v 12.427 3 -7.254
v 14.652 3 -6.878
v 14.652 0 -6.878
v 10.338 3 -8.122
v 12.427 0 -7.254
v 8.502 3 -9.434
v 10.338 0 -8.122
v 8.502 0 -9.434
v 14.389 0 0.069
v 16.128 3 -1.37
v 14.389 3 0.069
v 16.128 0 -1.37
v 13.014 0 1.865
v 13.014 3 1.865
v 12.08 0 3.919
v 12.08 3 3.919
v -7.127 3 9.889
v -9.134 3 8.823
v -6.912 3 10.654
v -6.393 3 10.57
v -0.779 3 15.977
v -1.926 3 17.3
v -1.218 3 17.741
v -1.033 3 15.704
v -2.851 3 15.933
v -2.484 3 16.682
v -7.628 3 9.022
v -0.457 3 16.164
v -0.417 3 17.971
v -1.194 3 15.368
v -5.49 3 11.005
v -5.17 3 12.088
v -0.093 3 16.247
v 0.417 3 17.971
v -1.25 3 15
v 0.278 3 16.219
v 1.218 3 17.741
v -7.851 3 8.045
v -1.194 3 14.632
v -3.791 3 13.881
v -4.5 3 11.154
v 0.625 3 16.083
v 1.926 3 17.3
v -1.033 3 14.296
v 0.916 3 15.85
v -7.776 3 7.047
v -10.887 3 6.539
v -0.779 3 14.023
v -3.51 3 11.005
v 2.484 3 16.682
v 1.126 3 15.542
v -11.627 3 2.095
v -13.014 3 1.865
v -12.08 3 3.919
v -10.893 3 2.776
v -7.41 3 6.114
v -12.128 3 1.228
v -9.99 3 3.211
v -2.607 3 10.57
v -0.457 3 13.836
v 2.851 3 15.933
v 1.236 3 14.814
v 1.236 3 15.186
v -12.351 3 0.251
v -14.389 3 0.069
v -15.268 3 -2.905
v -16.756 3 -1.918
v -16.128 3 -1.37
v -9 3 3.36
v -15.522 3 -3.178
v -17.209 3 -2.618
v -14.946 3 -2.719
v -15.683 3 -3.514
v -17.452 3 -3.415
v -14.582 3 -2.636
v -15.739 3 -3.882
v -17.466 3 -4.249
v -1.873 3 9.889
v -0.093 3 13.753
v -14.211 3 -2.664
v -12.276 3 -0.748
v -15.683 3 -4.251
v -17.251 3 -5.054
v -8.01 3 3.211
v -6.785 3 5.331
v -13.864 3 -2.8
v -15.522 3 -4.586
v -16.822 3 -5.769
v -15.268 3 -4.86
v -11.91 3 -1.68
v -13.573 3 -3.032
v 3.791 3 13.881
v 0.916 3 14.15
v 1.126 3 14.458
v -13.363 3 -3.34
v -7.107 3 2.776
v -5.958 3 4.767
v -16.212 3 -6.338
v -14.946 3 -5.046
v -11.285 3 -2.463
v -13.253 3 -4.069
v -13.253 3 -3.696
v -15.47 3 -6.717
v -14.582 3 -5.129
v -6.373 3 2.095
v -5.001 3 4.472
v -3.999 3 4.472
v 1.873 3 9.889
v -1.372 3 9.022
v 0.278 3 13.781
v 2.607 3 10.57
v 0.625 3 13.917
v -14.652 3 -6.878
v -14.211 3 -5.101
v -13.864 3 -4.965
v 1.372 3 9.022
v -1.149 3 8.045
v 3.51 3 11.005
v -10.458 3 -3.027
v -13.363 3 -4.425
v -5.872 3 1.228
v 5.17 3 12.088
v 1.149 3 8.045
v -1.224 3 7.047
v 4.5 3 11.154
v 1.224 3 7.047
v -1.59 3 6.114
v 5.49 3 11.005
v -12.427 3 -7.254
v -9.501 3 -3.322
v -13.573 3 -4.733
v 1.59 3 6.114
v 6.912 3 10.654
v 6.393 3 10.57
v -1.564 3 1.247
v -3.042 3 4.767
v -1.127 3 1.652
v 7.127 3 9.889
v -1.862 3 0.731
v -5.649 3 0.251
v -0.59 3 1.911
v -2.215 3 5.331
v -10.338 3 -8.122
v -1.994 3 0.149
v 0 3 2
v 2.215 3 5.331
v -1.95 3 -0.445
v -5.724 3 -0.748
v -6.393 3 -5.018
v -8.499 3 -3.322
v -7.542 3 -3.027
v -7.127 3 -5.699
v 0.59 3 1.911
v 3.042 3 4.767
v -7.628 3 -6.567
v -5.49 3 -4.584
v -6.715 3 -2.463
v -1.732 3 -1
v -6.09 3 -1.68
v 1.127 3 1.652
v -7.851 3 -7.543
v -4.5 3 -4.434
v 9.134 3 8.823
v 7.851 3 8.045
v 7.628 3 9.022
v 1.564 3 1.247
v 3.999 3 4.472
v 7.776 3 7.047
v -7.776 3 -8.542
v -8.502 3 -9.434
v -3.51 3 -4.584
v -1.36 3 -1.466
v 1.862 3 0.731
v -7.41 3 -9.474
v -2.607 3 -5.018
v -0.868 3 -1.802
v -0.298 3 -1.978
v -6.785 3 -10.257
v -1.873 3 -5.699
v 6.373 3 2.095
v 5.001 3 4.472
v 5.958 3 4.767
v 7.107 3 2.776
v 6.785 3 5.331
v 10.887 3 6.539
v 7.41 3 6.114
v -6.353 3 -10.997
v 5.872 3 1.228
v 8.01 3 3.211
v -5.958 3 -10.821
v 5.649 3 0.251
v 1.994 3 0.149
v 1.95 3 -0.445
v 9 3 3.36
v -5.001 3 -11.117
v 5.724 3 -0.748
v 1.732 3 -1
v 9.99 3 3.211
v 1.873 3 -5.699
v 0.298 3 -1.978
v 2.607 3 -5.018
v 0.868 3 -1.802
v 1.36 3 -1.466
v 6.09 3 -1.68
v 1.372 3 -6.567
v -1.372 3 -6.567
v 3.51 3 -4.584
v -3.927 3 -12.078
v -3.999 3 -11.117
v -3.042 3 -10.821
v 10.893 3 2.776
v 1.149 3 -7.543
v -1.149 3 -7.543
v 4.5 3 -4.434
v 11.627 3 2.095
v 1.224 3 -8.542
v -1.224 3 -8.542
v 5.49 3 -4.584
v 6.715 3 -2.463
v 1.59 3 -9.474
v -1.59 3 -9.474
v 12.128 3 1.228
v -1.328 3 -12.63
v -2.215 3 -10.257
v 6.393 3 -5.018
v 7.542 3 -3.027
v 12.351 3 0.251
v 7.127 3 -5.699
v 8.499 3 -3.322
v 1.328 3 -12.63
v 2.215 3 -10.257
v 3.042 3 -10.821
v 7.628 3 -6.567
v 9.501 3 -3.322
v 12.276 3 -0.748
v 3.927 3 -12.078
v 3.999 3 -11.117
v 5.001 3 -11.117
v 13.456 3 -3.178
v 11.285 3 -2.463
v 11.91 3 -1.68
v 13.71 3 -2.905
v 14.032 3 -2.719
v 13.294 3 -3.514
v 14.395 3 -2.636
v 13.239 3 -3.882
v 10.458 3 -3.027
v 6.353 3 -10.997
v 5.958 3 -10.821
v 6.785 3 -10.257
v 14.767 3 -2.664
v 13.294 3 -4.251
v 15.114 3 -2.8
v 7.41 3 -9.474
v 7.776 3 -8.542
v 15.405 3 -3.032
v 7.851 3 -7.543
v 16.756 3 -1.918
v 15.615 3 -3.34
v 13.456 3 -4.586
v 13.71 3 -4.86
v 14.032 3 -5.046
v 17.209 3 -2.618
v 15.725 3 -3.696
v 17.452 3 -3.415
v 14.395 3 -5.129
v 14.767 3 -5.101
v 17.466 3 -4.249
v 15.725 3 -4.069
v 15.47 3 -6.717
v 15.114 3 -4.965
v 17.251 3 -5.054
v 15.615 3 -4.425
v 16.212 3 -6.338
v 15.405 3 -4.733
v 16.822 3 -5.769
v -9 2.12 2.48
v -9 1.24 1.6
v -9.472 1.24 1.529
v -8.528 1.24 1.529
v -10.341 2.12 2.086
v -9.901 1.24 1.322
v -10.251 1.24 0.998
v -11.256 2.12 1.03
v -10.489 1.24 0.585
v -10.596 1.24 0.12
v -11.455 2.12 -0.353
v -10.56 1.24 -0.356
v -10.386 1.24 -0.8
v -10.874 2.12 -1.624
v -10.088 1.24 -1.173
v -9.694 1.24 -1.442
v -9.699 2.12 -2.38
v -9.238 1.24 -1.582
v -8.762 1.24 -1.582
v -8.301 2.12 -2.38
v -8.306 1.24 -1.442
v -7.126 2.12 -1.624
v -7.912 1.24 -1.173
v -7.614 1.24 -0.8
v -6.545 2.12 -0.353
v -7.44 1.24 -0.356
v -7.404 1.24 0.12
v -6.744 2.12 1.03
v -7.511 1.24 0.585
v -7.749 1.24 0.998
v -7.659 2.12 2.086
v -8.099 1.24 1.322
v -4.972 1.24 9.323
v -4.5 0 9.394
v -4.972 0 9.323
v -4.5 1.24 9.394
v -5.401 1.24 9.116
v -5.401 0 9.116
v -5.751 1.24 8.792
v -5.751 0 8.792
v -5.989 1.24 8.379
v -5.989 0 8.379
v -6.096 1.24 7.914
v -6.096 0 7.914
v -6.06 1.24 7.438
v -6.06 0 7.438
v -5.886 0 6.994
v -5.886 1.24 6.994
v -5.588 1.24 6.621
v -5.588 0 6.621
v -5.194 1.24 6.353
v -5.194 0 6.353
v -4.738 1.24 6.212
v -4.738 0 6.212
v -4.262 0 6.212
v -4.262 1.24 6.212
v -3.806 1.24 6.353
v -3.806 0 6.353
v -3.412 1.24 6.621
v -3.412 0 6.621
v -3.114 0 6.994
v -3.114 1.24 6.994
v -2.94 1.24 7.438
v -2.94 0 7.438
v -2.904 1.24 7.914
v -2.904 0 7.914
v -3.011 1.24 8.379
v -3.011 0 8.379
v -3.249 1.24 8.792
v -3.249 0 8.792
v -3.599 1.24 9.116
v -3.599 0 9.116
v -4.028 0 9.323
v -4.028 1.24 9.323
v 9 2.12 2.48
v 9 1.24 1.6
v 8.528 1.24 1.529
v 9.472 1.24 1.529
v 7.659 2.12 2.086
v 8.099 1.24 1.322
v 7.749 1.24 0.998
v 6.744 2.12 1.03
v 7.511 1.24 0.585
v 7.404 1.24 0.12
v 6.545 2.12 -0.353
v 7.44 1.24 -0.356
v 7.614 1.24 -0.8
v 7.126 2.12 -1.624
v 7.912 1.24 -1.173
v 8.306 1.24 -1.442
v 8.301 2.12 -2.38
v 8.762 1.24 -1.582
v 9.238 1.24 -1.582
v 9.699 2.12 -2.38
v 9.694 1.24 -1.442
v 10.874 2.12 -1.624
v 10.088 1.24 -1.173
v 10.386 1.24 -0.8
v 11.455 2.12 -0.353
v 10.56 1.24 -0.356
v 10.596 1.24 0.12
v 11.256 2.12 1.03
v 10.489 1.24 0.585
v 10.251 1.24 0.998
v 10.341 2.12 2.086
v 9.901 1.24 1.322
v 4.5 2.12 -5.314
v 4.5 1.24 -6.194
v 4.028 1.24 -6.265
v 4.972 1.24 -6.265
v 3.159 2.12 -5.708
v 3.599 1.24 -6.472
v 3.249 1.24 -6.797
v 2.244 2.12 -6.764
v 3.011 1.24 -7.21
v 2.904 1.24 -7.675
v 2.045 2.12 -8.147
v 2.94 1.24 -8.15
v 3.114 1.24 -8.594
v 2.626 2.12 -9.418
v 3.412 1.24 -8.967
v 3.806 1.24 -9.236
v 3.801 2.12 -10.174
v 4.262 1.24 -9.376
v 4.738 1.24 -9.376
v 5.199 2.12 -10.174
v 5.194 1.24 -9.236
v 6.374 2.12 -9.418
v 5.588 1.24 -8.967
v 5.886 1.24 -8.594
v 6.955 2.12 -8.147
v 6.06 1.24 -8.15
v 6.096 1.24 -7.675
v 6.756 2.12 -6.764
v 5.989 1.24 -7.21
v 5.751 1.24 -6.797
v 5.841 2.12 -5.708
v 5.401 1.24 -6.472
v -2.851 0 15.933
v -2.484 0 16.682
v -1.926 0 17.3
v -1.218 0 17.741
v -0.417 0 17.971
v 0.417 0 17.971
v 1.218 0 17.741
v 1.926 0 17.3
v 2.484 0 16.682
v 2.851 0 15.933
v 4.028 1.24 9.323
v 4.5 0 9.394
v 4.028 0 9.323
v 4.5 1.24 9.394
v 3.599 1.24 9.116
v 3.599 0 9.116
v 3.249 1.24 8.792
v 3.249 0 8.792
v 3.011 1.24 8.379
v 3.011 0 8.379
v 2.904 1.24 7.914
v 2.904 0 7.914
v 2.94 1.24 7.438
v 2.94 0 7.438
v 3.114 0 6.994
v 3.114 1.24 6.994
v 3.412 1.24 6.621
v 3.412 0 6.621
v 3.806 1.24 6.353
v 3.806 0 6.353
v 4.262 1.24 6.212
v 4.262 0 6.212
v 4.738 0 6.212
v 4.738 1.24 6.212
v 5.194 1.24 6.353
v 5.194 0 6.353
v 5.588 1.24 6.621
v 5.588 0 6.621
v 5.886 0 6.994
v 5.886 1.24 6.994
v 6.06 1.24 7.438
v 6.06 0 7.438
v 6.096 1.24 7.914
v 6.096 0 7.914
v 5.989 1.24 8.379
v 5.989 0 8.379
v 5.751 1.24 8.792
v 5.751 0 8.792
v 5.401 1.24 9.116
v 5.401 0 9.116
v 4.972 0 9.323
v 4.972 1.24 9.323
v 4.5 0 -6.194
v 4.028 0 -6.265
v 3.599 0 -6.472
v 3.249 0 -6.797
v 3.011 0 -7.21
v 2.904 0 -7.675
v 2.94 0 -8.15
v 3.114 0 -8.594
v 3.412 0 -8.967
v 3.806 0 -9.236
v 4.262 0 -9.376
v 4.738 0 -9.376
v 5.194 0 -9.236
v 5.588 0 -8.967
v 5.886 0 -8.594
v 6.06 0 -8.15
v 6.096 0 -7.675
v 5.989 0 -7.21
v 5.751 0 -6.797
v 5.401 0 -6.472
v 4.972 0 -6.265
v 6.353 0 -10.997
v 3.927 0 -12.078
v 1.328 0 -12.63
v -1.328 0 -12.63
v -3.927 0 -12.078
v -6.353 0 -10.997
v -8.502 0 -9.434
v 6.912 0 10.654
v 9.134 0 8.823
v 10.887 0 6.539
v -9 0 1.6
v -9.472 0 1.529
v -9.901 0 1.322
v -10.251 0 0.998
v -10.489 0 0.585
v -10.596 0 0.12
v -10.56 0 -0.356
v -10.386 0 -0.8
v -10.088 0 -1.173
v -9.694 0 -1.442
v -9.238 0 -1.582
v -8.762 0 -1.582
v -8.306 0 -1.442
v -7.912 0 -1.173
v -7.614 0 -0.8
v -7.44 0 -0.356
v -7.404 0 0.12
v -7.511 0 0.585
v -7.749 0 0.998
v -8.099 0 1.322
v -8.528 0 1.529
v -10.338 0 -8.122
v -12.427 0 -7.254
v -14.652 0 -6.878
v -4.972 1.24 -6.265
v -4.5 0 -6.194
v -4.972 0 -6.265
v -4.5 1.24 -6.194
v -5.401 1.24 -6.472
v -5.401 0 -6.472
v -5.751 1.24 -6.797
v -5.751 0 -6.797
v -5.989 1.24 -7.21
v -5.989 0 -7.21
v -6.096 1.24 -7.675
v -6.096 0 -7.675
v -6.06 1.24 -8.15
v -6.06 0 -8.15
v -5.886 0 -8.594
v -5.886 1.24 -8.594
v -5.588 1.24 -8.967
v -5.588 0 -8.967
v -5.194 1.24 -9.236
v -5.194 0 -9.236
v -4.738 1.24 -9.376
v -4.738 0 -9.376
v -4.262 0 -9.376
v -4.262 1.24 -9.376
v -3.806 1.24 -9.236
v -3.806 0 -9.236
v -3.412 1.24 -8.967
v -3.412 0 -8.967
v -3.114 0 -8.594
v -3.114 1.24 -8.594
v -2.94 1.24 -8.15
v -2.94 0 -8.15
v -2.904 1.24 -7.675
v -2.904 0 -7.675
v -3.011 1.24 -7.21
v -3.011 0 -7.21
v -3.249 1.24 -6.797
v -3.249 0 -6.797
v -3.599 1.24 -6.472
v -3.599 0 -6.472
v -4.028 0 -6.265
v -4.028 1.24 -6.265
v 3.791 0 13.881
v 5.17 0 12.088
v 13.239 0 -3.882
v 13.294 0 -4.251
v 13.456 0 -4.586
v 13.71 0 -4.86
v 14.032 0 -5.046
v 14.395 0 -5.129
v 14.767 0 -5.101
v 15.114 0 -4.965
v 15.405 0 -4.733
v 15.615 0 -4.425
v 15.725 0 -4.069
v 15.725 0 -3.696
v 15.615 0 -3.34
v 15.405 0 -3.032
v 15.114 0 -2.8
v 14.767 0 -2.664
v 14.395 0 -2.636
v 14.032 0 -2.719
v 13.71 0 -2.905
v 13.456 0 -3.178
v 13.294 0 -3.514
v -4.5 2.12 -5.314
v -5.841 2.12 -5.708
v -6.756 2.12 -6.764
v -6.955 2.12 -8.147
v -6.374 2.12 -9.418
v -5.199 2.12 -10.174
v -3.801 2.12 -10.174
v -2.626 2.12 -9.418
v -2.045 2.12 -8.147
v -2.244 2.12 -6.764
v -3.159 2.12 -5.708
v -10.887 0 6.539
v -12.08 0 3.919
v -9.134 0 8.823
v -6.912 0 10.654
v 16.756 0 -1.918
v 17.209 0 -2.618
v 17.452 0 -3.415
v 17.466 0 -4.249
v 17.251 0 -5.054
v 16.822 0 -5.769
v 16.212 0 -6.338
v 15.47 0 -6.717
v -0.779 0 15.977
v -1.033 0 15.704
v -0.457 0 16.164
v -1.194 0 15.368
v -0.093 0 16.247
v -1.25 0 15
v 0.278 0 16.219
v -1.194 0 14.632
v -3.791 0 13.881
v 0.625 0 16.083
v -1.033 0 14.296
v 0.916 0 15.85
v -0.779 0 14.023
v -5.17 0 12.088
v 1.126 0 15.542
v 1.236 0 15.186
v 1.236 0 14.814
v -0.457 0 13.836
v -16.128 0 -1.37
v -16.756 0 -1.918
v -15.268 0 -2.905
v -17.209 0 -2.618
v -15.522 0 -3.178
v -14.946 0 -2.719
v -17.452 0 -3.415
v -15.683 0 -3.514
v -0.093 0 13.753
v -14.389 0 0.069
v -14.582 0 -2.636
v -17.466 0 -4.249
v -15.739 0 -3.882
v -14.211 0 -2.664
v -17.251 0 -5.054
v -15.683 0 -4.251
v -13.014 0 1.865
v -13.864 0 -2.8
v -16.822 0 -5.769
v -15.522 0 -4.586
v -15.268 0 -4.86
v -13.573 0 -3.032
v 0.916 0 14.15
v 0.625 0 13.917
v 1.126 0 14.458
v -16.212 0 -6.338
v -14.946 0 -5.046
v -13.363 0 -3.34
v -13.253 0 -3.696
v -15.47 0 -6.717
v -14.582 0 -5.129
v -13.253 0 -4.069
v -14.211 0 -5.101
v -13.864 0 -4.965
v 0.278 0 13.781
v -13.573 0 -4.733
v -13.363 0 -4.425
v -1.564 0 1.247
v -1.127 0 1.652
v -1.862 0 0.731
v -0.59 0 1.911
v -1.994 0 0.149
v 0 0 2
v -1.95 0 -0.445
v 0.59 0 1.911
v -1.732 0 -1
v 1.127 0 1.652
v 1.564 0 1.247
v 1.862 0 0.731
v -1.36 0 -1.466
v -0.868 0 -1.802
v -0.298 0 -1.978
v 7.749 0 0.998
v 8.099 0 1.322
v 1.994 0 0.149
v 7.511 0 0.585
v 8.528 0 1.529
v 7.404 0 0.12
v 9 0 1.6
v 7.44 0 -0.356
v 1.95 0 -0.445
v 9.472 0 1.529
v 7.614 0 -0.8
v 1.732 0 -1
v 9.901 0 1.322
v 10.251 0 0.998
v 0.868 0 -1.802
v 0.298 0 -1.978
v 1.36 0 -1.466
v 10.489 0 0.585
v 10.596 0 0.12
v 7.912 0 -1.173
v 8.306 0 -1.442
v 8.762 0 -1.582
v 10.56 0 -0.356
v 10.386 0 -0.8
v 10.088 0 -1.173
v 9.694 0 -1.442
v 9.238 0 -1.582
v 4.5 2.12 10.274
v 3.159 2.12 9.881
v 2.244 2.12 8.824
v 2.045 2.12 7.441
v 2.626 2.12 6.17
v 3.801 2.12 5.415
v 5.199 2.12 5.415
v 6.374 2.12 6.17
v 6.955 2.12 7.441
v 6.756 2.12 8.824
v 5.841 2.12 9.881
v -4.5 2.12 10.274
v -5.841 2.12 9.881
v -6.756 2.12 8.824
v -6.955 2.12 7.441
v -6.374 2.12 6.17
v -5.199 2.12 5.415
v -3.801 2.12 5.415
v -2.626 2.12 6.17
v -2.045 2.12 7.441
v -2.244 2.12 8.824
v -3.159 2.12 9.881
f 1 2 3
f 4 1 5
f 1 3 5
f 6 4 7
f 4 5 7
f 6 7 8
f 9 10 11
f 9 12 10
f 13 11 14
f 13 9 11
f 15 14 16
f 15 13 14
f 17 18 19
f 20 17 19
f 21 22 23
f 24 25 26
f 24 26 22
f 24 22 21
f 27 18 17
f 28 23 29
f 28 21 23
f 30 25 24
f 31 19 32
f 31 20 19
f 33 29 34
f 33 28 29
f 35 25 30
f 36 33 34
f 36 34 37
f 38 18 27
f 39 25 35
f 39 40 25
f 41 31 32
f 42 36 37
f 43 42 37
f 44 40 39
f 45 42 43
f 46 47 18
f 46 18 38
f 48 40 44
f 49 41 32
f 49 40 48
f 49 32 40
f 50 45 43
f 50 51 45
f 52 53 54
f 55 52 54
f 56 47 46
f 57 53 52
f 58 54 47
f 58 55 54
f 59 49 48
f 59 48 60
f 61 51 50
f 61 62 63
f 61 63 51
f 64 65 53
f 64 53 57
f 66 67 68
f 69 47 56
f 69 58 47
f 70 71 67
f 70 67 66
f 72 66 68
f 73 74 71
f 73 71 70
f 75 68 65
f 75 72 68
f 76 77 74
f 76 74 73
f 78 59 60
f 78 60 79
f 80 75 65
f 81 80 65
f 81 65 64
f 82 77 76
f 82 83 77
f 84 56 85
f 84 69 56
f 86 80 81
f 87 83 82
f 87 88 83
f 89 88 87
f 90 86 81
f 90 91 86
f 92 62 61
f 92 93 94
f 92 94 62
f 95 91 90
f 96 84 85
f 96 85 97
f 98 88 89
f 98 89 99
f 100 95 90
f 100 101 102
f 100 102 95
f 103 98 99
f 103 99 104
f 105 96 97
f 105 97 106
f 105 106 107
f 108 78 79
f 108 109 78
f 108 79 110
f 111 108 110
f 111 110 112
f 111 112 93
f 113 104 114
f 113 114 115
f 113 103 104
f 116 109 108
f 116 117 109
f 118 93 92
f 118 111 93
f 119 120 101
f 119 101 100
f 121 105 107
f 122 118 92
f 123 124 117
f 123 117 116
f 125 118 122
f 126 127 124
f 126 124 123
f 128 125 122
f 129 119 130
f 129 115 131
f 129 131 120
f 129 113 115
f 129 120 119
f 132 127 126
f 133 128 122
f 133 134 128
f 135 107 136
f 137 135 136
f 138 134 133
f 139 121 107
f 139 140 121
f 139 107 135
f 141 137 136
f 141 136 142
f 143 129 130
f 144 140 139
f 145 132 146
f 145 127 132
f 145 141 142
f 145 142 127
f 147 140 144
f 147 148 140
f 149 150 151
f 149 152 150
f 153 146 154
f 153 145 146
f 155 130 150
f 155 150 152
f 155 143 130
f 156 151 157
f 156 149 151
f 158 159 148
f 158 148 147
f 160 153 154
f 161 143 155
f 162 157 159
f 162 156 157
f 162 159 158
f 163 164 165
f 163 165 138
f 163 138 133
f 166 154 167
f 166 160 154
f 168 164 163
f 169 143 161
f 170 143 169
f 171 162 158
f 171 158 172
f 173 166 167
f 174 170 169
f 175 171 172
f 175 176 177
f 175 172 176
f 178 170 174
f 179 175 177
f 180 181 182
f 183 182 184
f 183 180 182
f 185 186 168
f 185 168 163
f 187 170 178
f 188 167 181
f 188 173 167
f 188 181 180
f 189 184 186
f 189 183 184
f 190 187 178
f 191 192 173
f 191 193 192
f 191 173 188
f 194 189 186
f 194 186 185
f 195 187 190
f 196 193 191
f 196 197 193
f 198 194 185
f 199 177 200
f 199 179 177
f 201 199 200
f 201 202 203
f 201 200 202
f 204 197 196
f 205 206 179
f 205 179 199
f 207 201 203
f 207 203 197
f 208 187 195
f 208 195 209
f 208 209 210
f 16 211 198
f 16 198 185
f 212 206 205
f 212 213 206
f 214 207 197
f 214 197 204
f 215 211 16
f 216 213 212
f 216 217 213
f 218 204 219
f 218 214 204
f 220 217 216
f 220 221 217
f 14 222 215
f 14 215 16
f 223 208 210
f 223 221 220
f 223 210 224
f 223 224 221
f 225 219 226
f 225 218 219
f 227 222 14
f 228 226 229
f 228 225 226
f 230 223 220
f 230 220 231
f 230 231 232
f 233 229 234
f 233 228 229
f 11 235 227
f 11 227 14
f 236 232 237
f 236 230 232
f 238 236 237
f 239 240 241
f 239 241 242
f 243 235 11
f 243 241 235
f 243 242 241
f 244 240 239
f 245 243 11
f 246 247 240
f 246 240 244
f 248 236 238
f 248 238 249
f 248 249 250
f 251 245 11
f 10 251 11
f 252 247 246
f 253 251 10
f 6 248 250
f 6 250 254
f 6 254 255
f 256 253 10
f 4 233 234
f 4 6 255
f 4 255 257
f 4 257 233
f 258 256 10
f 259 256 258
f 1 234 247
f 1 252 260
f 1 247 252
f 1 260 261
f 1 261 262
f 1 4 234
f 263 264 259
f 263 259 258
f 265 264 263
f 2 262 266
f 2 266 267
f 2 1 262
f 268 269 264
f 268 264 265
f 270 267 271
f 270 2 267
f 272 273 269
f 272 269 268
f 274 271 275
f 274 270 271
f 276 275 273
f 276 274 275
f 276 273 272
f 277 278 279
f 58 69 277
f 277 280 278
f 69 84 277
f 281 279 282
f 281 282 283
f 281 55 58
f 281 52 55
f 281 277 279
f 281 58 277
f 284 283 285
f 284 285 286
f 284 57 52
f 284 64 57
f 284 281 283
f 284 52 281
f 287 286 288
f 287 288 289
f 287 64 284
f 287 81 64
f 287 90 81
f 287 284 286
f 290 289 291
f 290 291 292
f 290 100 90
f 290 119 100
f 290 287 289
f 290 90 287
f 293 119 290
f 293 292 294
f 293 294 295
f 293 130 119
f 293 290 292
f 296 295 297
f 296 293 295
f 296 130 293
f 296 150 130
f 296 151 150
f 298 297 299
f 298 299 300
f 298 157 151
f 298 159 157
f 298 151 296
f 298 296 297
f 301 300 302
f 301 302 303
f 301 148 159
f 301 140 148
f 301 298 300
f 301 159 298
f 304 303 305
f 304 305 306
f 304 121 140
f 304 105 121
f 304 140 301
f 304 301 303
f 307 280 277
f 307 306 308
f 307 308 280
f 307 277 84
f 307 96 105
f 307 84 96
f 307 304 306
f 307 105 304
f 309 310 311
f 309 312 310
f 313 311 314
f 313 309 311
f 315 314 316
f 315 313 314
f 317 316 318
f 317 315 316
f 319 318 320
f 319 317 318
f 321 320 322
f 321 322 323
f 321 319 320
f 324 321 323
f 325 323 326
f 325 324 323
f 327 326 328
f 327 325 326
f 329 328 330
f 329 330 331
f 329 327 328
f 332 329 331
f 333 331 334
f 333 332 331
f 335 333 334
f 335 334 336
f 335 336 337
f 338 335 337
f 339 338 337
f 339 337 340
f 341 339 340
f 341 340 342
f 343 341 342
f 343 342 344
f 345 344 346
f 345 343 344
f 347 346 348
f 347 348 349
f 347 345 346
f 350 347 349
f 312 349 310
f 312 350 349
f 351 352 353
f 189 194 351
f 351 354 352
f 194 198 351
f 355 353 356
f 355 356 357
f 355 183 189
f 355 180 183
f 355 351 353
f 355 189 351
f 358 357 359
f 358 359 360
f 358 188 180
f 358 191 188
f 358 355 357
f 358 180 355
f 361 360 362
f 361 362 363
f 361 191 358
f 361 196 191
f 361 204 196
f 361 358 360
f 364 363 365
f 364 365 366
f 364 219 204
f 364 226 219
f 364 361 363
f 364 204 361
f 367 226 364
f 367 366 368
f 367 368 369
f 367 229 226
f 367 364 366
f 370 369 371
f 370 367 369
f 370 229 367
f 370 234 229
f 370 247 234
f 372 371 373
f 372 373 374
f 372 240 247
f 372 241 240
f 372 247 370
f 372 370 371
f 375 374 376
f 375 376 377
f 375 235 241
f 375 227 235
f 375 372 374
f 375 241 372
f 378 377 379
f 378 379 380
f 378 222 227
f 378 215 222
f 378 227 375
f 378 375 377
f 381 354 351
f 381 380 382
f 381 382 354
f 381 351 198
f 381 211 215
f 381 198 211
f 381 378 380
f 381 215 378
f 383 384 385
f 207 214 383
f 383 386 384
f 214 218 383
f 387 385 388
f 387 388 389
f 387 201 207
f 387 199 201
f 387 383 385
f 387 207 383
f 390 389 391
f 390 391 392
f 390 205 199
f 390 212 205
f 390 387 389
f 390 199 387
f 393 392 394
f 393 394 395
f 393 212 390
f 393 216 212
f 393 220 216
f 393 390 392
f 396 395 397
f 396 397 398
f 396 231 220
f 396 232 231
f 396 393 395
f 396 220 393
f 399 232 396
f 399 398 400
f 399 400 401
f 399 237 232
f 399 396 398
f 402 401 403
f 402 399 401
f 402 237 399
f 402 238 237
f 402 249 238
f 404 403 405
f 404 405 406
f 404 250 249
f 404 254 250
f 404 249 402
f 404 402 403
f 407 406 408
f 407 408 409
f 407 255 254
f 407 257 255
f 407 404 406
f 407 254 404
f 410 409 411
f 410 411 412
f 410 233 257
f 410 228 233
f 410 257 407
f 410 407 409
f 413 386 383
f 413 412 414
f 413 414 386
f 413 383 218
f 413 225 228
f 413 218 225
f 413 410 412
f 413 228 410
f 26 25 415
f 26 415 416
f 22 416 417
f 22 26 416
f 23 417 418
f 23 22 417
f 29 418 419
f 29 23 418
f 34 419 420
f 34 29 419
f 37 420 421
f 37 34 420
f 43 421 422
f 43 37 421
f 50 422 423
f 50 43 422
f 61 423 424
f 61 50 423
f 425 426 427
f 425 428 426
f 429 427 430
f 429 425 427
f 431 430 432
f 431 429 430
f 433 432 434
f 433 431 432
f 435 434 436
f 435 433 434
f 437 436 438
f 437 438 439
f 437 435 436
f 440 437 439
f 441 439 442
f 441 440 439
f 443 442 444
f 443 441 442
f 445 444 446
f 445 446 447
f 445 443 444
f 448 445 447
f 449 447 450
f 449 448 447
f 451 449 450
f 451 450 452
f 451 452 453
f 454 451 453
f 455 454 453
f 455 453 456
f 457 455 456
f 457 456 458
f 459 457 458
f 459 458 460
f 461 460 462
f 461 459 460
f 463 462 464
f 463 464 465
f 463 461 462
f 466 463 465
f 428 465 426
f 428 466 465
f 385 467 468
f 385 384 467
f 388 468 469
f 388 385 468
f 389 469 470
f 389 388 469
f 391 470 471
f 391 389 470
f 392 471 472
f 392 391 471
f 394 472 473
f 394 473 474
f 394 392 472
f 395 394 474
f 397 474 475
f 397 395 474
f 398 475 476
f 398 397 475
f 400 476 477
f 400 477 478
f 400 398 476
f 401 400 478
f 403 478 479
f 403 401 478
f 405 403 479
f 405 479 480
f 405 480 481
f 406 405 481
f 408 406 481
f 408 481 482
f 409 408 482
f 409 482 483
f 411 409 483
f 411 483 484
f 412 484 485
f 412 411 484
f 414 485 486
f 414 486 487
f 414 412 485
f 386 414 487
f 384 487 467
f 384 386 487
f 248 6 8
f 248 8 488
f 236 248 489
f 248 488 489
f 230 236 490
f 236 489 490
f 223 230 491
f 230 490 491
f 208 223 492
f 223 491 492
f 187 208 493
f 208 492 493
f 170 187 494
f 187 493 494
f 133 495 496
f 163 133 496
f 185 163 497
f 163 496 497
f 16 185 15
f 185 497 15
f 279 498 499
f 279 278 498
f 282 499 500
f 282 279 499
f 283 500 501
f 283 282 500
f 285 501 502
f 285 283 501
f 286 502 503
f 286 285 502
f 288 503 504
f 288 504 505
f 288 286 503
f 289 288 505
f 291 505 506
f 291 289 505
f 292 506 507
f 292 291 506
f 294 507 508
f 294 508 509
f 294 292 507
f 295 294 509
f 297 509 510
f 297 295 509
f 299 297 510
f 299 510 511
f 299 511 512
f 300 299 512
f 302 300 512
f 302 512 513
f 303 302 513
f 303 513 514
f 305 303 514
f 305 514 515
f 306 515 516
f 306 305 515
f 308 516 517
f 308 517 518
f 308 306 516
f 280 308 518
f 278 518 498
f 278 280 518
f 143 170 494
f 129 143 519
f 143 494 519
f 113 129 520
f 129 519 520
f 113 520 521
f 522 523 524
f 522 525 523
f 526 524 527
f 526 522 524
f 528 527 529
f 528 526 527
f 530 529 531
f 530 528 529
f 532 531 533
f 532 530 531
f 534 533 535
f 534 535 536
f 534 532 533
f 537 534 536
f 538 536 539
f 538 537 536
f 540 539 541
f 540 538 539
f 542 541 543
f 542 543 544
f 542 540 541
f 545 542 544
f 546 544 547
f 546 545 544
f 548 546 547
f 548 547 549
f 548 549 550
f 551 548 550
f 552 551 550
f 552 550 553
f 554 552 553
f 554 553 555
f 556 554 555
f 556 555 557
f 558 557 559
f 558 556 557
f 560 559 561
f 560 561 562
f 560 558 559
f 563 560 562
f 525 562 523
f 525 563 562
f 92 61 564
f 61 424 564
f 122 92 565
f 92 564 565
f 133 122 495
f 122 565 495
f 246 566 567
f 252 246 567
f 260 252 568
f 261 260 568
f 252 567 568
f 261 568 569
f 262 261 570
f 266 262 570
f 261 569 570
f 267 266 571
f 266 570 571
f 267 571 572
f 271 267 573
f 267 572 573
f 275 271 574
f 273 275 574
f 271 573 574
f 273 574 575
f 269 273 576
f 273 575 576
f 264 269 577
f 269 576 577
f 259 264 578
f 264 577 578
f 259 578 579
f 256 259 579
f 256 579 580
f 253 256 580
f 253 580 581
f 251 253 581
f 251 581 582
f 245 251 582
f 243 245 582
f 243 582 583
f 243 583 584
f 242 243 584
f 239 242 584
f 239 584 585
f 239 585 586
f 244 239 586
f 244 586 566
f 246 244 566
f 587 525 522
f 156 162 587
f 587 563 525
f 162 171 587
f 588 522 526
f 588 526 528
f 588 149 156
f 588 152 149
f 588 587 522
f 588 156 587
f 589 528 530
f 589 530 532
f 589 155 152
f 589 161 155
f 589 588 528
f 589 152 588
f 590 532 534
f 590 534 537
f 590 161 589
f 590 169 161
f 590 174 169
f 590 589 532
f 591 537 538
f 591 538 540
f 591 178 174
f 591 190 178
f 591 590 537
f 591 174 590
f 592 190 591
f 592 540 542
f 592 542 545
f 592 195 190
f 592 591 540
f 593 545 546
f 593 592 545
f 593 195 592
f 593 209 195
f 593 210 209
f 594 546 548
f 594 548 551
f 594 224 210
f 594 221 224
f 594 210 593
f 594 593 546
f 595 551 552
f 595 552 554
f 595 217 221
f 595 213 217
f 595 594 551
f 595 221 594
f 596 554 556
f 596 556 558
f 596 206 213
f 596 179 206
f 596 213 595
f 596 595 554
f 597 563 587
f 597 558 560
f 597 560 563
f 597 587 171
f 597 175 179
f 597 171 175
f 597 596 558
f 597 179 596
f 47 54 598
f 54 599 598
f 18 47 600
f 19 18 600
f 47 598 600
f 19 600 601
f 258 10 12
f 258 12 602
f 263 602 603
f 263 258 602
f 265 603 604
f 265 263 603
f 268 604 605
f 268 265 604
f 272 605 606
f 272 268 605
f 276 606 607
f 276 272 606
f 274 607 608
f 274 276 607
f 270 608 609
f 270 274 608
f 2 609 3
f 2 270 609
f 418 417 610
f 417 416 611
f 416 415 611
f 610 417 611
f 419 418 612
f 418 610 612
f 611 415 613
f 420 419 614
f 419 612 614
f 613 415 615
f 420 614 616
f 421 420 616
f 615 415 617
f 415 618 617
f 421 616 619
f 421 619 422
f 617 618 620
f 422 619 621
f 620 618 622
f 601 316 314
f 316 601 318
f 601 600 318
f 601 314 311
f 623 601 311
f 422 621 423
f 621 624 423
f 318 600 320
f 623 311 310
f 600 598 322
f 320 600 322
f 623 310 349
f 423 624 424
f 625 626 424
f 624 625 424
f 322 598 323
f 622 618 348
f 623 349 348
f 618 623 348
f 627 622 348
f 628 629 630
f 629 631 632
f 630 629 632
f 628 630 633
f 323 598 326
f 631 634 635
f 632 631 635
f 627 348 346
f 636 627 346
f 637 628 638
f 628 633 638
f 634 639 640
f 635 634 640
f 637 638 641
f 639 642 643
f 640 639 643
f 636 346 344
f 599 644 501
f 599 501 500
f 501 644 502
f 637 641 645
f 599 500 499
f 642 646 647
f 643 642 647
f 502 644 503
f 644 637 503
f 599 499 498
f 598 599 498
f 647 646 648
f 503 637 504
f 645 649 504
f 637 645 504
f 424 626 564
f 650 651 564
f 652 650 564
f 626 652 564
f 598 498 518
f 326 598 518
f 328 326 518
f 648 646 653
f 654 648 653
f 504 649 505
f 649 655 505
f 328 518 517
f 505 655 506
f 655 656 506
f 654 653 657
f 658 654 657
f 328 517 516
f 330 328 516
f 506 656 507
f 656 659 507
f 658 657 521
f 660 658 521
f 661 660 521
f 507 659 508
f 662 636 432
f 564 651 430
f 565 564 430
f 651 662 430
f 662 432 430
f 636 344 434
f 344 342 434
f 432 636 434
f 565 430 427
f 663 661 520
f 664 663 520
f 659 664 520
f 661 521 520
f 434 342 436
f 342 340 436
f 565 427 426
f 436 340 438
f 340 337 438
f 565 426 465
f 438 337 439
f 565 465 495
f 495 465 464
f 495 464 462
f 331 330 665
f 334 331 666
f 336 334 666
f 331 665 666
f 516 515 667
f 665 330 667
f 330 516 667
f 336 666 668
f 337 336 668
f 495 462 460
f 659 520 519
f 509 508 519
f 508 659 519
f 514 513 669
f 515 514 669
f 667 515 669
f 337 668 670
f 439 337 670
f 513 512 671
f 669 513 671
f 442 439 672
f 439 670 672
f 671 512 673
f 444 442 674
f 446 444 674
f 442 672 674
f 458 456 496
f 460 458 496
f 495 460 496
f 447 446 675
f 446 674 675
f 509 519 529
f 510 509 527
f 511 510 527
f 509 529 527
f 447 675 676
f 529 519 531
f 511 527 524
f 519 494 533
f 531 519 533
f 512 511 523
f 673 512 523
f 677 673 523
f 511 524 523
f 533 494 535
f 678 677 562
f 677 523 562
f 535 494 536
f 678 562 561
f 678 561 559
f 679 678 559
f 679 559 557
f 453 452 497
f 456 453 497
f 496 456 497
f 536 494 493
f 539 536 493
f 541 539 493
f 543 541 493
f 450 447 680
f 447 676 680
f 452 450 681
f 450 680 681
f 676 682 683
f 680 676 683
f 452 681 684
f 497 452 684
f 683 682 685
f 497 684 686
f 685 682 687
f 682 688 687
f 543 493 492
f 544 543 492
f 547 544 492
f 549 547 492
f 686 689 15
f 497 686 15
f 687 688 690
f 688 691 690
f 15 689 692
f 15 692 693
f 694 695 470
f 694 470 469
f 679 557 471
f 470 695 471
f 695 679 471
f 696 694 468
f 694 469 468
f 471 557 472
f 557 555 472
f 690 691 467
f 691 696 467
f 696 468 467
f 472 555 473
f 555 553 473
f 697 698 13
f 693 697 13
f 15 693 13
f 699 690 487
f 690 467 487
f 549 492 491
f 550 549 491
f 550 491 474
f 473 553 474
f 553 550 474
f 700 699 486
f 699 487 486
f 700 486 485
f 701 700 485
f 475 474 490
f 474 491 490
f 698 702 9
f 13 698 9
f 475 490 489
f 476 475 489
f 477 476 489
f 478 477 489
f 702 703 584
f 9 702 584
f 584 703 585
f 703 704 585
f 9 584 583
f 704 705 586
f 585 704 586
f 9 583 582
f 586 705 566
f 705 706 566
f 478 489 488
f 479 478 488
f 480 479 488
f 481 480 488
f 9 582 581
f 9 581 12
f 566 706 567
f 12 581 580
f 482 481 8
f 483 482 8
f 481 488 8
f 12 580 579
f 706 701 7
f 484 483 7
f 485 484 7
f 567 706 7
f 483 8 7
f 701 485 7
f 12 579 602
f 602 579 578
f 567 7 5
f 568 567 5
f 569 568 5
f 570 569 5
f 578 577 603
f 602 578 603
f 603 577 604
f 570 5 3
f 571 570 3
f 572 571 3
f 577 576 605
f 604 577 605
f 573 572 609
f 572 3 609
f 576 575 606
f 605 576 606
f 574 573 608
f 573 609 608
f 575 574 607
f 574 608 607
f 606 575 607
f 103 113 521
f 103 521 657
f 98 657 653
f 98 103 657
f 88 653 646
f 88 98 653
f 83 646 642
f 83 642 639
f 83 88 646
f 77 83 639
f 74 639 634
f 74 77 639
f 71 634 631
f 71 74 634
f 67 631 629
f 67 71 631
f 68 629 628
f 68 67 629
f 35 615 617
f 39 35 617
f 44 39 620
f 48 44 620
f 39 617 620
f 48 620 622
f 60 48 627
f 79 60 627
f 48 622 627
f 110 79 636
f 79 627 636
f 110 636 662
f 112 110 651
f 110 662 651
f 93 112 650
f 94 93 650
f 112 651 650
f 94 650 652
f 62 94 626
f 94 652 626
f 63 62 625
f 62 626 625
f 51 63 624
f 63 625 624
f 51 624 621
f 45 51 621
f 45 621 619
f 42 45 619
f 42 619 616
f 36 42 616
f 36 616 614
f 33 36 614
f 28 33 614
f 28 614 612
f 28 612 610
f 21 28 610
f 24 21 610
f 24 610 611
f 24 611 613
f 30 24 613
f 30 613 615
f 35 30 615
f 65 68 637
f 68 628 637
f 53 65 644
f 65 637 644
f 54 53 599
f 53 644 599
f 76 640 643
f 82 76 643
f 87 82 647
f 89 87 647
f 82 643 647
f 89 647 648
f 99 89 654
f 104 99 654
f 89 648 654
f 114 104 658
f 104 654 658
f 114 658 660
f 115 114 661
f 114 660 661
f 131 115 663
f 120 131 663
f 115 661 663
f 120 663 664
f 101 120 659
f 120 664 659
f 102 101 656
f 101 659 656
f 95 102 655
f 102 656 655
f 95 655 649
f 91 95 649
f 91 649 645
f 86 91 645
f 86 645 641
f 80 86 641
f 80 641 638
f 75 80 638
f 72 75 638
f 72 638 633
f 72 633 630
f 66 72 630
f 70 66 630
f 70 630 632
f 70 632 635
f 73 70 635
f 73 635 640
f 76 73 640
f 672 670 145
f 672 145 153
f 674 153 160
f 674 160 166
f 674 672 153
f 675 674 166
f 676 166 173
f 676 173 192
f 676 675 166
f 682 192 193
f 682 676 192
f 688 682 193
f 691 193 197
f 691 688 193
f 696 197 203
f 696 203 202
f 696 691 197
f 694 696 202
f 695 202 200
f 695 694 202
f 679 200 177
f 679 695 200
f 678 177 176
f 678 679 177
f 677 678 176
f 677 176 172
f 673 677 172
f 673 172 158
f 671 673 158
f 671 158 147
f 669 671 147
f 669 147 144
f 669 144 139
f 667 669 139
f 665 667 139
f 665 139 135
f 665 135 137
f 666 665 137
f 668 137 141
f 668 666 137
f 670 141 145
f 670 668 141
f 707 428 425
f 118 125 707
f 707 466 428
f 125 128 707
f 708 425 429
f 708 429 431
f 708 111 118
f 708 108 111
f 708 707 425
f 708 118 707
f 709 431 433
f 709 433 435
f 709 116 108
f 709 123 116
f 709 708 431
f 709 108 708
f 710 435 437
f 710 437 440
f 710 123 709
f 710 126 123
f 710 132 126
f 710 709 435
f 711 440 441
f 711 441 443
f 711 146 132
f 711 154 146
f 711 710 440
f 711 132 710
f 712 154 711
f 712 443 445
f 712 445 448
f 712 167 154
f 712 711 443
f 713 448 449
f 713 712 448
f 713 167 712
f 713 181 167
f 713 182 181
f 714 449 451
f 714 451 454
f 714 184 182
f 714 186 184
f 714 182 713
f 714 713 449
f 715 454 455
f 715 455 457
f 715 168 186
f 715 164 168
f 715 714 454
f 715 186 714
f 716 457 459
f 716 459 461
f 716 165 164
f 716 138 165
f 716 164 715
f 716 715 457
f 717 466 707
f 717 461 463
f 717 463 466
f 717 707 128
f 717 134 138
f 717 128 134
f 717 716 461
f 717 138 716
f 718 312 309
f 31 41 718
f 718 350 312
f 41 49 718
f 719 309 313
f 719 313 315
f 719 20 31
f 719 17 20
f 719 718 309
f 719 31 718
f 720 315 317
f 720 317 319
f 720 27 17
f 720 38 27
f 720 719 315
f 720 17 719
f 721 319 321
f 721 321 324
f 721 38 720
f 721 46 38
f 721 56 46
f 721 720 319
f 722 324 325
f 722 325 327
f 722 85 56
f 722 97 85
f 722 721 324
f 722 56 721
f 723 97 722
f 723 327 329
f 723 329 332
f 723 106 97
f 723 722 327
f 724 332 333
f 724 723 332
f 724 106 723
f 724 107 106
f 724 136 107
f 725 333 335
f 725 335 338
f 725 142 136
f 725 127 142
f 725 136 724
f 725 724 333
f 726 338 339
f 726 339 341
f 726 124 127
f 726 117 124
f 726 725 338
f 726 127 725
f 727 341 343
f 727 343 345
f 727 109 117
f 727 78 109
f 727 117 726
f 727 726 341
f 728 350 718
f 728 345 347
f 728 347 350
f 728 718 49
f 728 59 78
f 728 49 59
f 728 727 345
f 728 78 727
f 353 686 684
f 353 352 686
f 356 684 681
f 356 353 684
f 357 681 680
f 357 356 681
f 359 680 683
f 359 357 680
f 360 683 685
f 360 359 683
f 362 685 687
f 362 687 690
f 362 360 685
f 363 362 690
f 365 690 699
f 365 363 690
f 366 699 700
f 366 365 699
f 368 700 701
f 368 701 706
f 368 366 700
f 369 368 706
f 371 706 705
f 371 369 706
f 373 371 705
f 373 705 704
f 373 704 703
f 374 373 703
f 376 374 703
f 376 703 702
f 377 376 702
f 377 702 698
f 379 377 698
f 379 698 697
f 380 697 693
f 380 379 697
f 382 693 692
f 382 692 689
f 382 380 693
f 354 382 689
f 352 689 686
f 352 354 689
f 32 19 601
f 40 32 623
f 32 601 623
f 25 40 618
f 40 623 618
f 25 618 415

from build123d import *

# Parameters (mm, degrees)
SKETCH1_R                    = 12.7
SKETCH1_R_2                  = 2
BOSS_EXTRUDE1_DEPTH          = 3
CSK_FOR_M3_SFHCS1_AT_2_COUNT = 2
CSK_FOR_M3_SFHCS1_AT_2_PITCH = 9
CSK_FOR_M3_SFHCS1_AT_3_COUNT = 2
CSK_FOR_M3_SFHCS1_AT_3_PITCH = 15.588457268
CSK_FOR_M3_SFHCS1_AT_4_COUNT = 2
CSK_FOR_M3_SFHCS1_AT_4_PITCH = 18
CSK_FOR_M3_SFHCS1_AT_5_COUNT = 2
CSK_FOR_M3_SFHCS1_AT_5_PITCH = 15.588457268
CSK_FOR_M3_SFHCS1_AT_6_COUNT = 2
CSK_FOR_M3_SFHCS1_AT_6_PITCH = 9
SKETCH6_R                    = 3
BOSS_EXTRUDE2_DEPTH          = 3
FILLET1_R                    = 10
TAP_DRILL_FOR_M3X0_5_TAP1_D  = 2.5


with BuildPart() as part:
    # Sketch1 → Boss-Extrude1 (new body)
    with BuildSketch(Plane(origin=(0, 0, 0), x_dir=(1, 0, 0), z_dir=(0, 1, 0))):
        with Locations(Location((0, 0, 0), (0, 0, 270))):
            Circle(SKETCH1_R)
        with Locations(Location((0, 0, 0), (0, 0, 270))):
            Circle(SKETCH1_R_2, mode=Mode.SUBTRACT)
    extrude(amount=BOSS_EXTRUDE1_DEPTH)

    # Sketch3 → CSK for M3 SFHCS1 (revolve, cut)
    with BuildSketch(Plane(origin=(-9, 3, 0), x_dir=(0, 0, 1), z_dir=(1, 0, 0))):
        Polygon((0, 0), (0, 3), (1.6, 3), (1.6, 1.76), (3.36, 0), align=None)
    csk_for_m3_sfhcs1 = revolve(axis=Axis((-9, 9.35, 0), (0, -1, 0)), mode=Mode.SUBTRACT)

    # CSK for M3 SFHCS1 at 2: CSK for M3 SFHCS1 ×2
    with Locations(*[Vector(0.5000000000000003, 0, -0.8660254037844386) * (i * CSK_FOR_M3_SFHCS1_AT_2_PITCH) for i in range(1, CSK_FOR_M3_SFHCS1_AT_2_COUNT)]):
        add(csk_for_m3_sfhcs1, mode=Mode.SUBTRACT)

    # CSK for M3 SFHCS1 at 3: CSK for M3 SFHCS1 ×2
    with Locations(*[Vector(0.8660254037844387, 0, -0.4999999999999999) * (i * CSK_FOR_M3_SFHCS1_AT_3_PITCH) for i in range(1, CSK_FOR_M3_SFHCS1_AT_3_COUNT)]):
        add(csk_for_m3_sfhcs1, mode=Mode.SUBTRACT)

    # CSK for M3 SFHCS1 at 4: CSK for M3 SFHCS1 ×2
    with Locations(*[(i * CSK_FOR_M3_SFHCS1_AT_4_PITCH, 0, 0) for i in range(1, CSK_FOR_M3_SFHCS1_AT_4_COUNT)]):
        add(csk_for_m3_sfhcs1, mode=Mode.SUBTRACT)

    # CSK for M3 SFHCS1 at 5: CSK for M3 SFHCS1 ×2
    with Locations(*[Vector(0.8660254037844387, 0, 0.49999999999999994) * (i * CSK_FOR_M3_SFHCS1_AT_5_PITCH) for i in range(1, CSK_FOR_M3_SFHCS1_AT_5_COUNT)]):
        add(csk_for_m3_sfhcs1, mode=Mode.SUBTRACT)

    # CSK for M3 SFHCS1 at 6: CSK for M3 SFHCS1 ×2
    with Locations(*[Vector(0.5000000000000002, 0, 0.8660254037844386) * (i * CSK_FOR_M3_SFHCS1_AT_6_PITCH) for i in range(1, CSK_FOR_M3_SFHCS1_AT_6_COUNT)]):
        add(csk_for_m3_sfhcs1, mode=Mode.SUBTRACT)

    # Sketch6 → Boss-Extrude2 (add)
    with BuildSketch(Plane(origin=(0, 3, 0), x_dir=(1, 0, 0), z_dir=(0, 1, 0))):
        with Locations((14.488887394, 3.882285677)):
            Circle(SKETCH6_R)
        with Locations((0, -15)):
            Circle(SKETCH6_R)
        with Locations((-14.488887394, 3.882285677)):
            Circle(SKETCH6_R)
    extrude(amount=-BOSS_EXTRUDE2_DEPTH)

    # Fillet1
    fillet1_edges = [part.edges().sort_by_distance(p)[0] for p in [
        (11.690211932, 1.5, -4.962755785),
        (12.605398401, 1.5, -1.547233383),
        (1.768004493, 1.5, 12.576333333),
        (-1.768004493, 1.5, 12.576333333),
        (-11.690211932, 1.5, -4.962755785),
        (-12.605398401, 1.5, -1.547233383),
    ]]
    fillet(fillet1_edges, radius=FILLET1_R)

    # Tap Drill for M3x0.5 Tap1 (through all)
    with Locations(Plane(origin=(0, 3, 0), x_dir=(1, 0, 0), z_dir=(0, 1, 0))):
        with Locations((-14.488887394, 3.882285677), (14.488887394, 3.882285677), (0, -15)):
            Hole(TAP_DRILL_FOR_M3X0_5_TAP1_D / 2)


solid = part.part
